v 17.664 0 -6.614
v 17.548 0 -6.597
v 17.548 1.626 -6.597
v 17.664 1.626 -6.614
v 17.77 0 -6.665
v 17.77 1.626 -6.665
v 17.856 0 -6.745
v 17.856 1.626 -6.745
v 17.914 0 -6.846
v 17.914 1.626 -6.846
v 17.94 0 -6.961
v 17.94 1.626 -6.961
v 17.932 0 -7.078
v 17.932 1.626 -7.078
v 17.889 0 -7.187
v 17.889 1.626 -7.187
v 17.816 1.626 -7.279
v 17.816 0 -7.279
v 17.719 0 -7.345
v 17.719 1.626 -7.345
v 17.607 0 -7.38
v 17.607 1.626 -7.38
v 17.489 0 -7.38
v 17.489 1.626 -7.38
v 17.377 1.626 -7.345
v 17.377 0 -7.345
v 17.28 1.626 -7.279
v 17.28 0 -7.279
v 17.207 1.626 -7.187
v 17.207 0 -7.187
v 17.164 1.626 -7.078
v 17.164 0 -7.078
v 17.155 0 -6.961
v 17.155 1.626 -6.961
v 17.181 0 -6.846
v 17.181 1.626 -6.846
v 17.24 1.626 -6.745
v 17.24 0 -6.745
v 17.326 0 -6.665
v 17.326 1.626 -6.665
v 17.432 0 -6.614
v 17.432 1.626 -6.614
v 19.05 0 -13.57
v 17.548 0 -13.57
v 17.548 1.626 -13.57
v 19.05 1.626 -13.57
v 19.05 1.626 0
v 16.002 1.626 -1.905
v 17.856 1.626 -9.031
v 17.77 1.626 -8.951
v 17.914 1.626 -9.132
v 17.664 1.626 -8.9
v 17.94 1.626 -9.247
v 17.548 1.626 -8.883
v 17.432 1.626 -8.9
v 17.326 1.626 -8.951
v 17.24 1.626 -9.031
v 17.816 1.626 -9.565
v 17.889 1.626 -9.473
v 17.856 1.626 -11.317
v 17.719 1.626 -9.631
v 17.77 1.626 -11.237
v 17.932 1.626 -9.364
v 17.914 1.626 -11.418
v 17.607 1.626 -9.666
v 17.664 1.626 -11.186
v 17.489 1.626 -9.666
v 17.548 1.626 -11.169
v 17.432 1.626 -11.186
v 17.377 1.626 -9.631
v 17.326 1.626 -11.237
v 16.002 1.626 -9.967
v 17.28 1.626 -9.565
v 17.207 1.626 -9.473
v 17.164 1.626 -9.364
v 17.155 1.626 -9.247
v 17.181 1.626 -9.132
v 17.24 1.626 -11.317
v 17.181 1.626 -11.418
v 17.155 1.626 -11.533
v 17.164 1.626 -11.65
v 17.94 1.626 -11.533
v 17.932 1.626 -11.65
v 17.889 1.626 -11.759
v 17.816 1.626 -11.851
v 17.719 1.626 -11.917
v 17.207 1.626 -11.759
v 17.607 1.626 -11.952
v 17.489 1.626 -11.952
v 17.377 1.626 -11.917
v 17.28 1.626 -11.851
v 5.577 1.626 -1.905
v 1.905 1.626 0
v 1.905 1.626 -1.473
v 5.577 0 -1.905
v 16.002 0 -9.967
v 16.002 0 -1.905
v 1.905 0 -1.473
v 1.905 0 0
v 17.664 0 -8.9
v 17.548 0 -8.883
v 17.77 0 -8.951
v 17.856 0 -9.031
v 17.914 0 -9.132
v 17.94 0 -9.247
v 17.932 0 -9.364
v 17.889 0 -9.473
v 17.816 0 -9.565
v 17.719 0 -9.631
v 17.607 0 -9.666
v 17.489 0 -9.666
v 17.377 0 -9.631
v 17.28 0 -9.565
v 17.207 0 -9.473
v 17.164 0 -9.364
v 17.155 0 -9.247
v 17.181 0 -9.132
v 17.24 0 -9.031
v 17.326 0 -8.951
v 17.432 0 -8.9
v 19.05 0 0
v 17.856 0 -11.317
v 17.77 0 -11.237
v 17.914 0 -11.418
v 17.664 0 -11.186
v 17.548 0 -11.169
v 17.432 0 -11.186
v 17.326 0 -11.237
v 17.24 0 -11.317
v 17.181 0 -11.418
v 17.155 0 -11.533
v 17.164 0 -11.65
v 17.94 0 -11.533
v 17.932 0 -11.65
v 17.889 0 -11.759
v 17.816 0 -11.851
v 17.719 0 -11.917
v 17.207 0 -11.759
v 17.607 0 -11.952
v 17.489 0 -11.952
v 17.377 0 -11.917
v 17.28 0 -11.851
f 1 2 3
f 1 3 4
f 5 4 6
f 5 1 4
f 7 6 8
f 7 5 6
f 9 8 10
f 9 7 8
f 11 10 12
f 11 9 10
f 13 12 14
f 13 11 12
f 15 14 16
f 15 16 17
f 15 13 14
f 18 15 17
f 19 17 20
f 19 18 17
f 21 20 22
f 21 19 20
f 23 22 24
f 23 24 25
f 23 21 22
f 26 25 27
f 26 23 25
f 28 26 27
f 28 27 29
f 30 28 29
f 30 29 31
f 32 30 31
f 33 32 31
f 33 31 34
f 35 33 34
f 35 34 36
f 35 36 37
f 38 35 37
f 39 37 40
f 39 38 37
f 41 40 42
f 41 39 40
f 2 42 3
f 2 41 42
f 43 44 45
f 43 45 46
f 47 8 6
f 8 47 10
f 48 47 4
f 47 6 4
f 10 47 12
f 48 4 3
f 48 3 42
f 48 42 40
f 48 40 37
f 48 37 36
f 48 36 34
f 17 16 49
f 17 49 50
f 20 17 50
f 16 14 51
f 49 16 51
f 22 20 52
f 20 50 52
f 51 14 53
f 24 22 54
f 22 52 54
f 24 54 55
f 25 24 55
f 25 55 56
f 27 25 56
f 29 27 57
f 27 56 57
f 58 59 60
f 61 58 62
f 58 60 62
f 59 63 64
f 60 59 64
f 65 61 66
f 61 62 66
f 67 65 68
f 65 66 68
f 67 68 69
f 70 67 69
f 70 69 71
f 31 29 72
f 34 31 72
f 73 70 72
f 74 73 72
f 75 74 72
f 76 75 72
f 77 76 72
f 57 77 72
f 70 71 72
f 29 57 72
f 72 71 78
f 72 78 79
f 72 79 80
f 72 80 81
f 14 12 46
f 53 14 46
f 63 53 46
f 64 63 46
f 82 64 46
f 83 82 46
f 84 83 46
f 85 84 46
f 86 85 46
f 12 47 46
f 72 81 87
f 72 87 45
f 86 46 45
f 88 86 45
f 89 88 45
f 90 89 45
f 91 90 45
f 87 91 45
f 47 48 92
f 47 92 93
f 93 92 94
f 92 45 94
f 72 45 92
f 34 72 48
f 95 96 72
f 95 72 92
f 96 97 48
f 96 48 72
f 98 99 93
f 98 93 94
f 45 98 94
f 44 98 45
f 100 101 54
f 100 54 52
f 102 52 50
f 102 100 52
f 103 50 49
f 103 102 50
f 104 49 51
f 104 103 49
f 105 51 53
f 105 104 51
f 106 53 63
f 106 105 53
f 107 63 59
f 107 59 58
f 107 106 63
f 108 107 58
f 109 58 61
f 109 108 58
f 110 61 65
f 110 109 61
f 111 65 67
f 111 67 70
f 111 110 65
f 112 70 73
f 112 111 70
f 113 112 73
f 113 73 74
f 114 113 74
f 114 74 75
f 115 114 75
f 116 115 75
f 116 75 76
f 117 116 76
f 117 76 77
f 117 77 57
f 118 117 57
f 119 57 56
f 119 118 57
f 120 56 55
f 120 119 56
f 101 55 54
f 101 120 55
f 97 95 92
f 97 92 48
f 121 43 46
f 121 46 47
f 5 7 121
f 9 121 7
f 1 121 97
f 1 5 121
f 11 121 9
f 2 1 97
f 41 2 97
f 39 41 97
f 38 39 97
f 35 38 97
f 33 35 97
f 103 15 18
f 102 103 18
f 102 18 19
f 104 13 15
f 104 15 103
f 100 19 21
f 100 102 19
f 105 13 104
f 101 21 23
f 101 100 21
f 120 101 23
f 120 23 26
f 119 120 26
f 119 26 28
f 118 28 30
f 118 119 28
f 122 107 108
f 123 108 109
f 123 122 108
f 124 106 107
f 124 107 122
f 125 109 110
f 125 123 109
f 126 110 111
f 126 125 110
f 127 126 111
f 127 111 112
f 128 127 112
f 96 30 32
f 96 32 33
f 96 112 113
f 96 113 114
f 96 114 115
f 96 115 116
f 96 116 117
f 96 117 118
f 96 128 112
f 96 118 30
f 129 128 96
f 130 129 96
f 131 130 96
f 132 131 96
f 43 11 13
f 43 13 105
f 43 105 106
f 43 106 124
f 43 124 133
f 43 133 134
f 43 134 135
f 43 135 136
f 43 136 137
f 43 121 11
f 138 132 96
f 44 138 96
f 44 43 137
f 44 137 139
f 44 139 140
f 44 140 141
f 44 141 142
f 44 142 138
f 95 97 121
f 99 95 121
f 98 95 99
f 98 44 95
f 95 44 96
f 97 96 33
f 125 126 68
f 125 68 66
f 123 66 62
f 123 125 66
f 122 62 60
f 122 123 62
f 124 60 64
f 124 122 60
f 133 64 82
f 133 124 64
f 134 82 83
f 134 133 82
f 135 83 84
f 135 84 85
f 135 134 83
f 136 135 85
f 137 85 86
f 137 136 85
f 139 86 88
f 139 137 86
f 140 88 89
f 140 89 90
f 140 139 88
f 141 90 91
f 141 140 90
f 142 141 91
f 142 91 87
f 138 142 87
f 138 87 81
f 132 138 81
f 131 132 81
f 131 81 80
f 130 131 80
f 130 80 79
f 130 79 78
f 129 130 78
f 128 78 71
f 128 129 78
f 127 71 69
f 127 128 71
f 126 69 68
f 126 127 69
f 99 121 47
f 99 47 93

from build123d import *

# Parameters (mm, degrees)
SKETCH1_R           = 0.3937
BOSS_EXTRUDE1_DEPTH = 1.6256


with BuildPart() as part:
    # Sketch1 → Boss-Extrude1 (new body)
    with BuildSketch(Plane(origin=(0, 0, 0), x_dir=(1, 0, 0), z_dir=(0, 1, 0))):
        Polygon((1.905, 1.4732), (17.54785055, 13.570337759), (19.05, 13.570337759), (19.05, 0), (1.905, 0), align=None)
        with Locations(Location((17.54785055, 11.562216741, 0), (0, 0, 270))):
            Circle(SKETCH1_R, mode=Mode.SUBTRACT)
        with Locations(Location((17.54785055, 9.276216741, 0), (0, 0, 270))):
            Circle(SKETCH1_R, mode=Mode.SUBTRACT)
        with Locations(Location((17.54785055, 6.990216741, 0), (0, 0, 270))):
            Circle(SKETCH1_R, mode=Mode.SUBTRACT)
        Polygon((5.577391241, 1.905), (16.002, 1.905), (16.002, 9.96669744), align=None, mode=Mode.SUBTRACT)
    extrude(amount=BOSS_EXTRUDE1_DEPTH)


solid = part.part
